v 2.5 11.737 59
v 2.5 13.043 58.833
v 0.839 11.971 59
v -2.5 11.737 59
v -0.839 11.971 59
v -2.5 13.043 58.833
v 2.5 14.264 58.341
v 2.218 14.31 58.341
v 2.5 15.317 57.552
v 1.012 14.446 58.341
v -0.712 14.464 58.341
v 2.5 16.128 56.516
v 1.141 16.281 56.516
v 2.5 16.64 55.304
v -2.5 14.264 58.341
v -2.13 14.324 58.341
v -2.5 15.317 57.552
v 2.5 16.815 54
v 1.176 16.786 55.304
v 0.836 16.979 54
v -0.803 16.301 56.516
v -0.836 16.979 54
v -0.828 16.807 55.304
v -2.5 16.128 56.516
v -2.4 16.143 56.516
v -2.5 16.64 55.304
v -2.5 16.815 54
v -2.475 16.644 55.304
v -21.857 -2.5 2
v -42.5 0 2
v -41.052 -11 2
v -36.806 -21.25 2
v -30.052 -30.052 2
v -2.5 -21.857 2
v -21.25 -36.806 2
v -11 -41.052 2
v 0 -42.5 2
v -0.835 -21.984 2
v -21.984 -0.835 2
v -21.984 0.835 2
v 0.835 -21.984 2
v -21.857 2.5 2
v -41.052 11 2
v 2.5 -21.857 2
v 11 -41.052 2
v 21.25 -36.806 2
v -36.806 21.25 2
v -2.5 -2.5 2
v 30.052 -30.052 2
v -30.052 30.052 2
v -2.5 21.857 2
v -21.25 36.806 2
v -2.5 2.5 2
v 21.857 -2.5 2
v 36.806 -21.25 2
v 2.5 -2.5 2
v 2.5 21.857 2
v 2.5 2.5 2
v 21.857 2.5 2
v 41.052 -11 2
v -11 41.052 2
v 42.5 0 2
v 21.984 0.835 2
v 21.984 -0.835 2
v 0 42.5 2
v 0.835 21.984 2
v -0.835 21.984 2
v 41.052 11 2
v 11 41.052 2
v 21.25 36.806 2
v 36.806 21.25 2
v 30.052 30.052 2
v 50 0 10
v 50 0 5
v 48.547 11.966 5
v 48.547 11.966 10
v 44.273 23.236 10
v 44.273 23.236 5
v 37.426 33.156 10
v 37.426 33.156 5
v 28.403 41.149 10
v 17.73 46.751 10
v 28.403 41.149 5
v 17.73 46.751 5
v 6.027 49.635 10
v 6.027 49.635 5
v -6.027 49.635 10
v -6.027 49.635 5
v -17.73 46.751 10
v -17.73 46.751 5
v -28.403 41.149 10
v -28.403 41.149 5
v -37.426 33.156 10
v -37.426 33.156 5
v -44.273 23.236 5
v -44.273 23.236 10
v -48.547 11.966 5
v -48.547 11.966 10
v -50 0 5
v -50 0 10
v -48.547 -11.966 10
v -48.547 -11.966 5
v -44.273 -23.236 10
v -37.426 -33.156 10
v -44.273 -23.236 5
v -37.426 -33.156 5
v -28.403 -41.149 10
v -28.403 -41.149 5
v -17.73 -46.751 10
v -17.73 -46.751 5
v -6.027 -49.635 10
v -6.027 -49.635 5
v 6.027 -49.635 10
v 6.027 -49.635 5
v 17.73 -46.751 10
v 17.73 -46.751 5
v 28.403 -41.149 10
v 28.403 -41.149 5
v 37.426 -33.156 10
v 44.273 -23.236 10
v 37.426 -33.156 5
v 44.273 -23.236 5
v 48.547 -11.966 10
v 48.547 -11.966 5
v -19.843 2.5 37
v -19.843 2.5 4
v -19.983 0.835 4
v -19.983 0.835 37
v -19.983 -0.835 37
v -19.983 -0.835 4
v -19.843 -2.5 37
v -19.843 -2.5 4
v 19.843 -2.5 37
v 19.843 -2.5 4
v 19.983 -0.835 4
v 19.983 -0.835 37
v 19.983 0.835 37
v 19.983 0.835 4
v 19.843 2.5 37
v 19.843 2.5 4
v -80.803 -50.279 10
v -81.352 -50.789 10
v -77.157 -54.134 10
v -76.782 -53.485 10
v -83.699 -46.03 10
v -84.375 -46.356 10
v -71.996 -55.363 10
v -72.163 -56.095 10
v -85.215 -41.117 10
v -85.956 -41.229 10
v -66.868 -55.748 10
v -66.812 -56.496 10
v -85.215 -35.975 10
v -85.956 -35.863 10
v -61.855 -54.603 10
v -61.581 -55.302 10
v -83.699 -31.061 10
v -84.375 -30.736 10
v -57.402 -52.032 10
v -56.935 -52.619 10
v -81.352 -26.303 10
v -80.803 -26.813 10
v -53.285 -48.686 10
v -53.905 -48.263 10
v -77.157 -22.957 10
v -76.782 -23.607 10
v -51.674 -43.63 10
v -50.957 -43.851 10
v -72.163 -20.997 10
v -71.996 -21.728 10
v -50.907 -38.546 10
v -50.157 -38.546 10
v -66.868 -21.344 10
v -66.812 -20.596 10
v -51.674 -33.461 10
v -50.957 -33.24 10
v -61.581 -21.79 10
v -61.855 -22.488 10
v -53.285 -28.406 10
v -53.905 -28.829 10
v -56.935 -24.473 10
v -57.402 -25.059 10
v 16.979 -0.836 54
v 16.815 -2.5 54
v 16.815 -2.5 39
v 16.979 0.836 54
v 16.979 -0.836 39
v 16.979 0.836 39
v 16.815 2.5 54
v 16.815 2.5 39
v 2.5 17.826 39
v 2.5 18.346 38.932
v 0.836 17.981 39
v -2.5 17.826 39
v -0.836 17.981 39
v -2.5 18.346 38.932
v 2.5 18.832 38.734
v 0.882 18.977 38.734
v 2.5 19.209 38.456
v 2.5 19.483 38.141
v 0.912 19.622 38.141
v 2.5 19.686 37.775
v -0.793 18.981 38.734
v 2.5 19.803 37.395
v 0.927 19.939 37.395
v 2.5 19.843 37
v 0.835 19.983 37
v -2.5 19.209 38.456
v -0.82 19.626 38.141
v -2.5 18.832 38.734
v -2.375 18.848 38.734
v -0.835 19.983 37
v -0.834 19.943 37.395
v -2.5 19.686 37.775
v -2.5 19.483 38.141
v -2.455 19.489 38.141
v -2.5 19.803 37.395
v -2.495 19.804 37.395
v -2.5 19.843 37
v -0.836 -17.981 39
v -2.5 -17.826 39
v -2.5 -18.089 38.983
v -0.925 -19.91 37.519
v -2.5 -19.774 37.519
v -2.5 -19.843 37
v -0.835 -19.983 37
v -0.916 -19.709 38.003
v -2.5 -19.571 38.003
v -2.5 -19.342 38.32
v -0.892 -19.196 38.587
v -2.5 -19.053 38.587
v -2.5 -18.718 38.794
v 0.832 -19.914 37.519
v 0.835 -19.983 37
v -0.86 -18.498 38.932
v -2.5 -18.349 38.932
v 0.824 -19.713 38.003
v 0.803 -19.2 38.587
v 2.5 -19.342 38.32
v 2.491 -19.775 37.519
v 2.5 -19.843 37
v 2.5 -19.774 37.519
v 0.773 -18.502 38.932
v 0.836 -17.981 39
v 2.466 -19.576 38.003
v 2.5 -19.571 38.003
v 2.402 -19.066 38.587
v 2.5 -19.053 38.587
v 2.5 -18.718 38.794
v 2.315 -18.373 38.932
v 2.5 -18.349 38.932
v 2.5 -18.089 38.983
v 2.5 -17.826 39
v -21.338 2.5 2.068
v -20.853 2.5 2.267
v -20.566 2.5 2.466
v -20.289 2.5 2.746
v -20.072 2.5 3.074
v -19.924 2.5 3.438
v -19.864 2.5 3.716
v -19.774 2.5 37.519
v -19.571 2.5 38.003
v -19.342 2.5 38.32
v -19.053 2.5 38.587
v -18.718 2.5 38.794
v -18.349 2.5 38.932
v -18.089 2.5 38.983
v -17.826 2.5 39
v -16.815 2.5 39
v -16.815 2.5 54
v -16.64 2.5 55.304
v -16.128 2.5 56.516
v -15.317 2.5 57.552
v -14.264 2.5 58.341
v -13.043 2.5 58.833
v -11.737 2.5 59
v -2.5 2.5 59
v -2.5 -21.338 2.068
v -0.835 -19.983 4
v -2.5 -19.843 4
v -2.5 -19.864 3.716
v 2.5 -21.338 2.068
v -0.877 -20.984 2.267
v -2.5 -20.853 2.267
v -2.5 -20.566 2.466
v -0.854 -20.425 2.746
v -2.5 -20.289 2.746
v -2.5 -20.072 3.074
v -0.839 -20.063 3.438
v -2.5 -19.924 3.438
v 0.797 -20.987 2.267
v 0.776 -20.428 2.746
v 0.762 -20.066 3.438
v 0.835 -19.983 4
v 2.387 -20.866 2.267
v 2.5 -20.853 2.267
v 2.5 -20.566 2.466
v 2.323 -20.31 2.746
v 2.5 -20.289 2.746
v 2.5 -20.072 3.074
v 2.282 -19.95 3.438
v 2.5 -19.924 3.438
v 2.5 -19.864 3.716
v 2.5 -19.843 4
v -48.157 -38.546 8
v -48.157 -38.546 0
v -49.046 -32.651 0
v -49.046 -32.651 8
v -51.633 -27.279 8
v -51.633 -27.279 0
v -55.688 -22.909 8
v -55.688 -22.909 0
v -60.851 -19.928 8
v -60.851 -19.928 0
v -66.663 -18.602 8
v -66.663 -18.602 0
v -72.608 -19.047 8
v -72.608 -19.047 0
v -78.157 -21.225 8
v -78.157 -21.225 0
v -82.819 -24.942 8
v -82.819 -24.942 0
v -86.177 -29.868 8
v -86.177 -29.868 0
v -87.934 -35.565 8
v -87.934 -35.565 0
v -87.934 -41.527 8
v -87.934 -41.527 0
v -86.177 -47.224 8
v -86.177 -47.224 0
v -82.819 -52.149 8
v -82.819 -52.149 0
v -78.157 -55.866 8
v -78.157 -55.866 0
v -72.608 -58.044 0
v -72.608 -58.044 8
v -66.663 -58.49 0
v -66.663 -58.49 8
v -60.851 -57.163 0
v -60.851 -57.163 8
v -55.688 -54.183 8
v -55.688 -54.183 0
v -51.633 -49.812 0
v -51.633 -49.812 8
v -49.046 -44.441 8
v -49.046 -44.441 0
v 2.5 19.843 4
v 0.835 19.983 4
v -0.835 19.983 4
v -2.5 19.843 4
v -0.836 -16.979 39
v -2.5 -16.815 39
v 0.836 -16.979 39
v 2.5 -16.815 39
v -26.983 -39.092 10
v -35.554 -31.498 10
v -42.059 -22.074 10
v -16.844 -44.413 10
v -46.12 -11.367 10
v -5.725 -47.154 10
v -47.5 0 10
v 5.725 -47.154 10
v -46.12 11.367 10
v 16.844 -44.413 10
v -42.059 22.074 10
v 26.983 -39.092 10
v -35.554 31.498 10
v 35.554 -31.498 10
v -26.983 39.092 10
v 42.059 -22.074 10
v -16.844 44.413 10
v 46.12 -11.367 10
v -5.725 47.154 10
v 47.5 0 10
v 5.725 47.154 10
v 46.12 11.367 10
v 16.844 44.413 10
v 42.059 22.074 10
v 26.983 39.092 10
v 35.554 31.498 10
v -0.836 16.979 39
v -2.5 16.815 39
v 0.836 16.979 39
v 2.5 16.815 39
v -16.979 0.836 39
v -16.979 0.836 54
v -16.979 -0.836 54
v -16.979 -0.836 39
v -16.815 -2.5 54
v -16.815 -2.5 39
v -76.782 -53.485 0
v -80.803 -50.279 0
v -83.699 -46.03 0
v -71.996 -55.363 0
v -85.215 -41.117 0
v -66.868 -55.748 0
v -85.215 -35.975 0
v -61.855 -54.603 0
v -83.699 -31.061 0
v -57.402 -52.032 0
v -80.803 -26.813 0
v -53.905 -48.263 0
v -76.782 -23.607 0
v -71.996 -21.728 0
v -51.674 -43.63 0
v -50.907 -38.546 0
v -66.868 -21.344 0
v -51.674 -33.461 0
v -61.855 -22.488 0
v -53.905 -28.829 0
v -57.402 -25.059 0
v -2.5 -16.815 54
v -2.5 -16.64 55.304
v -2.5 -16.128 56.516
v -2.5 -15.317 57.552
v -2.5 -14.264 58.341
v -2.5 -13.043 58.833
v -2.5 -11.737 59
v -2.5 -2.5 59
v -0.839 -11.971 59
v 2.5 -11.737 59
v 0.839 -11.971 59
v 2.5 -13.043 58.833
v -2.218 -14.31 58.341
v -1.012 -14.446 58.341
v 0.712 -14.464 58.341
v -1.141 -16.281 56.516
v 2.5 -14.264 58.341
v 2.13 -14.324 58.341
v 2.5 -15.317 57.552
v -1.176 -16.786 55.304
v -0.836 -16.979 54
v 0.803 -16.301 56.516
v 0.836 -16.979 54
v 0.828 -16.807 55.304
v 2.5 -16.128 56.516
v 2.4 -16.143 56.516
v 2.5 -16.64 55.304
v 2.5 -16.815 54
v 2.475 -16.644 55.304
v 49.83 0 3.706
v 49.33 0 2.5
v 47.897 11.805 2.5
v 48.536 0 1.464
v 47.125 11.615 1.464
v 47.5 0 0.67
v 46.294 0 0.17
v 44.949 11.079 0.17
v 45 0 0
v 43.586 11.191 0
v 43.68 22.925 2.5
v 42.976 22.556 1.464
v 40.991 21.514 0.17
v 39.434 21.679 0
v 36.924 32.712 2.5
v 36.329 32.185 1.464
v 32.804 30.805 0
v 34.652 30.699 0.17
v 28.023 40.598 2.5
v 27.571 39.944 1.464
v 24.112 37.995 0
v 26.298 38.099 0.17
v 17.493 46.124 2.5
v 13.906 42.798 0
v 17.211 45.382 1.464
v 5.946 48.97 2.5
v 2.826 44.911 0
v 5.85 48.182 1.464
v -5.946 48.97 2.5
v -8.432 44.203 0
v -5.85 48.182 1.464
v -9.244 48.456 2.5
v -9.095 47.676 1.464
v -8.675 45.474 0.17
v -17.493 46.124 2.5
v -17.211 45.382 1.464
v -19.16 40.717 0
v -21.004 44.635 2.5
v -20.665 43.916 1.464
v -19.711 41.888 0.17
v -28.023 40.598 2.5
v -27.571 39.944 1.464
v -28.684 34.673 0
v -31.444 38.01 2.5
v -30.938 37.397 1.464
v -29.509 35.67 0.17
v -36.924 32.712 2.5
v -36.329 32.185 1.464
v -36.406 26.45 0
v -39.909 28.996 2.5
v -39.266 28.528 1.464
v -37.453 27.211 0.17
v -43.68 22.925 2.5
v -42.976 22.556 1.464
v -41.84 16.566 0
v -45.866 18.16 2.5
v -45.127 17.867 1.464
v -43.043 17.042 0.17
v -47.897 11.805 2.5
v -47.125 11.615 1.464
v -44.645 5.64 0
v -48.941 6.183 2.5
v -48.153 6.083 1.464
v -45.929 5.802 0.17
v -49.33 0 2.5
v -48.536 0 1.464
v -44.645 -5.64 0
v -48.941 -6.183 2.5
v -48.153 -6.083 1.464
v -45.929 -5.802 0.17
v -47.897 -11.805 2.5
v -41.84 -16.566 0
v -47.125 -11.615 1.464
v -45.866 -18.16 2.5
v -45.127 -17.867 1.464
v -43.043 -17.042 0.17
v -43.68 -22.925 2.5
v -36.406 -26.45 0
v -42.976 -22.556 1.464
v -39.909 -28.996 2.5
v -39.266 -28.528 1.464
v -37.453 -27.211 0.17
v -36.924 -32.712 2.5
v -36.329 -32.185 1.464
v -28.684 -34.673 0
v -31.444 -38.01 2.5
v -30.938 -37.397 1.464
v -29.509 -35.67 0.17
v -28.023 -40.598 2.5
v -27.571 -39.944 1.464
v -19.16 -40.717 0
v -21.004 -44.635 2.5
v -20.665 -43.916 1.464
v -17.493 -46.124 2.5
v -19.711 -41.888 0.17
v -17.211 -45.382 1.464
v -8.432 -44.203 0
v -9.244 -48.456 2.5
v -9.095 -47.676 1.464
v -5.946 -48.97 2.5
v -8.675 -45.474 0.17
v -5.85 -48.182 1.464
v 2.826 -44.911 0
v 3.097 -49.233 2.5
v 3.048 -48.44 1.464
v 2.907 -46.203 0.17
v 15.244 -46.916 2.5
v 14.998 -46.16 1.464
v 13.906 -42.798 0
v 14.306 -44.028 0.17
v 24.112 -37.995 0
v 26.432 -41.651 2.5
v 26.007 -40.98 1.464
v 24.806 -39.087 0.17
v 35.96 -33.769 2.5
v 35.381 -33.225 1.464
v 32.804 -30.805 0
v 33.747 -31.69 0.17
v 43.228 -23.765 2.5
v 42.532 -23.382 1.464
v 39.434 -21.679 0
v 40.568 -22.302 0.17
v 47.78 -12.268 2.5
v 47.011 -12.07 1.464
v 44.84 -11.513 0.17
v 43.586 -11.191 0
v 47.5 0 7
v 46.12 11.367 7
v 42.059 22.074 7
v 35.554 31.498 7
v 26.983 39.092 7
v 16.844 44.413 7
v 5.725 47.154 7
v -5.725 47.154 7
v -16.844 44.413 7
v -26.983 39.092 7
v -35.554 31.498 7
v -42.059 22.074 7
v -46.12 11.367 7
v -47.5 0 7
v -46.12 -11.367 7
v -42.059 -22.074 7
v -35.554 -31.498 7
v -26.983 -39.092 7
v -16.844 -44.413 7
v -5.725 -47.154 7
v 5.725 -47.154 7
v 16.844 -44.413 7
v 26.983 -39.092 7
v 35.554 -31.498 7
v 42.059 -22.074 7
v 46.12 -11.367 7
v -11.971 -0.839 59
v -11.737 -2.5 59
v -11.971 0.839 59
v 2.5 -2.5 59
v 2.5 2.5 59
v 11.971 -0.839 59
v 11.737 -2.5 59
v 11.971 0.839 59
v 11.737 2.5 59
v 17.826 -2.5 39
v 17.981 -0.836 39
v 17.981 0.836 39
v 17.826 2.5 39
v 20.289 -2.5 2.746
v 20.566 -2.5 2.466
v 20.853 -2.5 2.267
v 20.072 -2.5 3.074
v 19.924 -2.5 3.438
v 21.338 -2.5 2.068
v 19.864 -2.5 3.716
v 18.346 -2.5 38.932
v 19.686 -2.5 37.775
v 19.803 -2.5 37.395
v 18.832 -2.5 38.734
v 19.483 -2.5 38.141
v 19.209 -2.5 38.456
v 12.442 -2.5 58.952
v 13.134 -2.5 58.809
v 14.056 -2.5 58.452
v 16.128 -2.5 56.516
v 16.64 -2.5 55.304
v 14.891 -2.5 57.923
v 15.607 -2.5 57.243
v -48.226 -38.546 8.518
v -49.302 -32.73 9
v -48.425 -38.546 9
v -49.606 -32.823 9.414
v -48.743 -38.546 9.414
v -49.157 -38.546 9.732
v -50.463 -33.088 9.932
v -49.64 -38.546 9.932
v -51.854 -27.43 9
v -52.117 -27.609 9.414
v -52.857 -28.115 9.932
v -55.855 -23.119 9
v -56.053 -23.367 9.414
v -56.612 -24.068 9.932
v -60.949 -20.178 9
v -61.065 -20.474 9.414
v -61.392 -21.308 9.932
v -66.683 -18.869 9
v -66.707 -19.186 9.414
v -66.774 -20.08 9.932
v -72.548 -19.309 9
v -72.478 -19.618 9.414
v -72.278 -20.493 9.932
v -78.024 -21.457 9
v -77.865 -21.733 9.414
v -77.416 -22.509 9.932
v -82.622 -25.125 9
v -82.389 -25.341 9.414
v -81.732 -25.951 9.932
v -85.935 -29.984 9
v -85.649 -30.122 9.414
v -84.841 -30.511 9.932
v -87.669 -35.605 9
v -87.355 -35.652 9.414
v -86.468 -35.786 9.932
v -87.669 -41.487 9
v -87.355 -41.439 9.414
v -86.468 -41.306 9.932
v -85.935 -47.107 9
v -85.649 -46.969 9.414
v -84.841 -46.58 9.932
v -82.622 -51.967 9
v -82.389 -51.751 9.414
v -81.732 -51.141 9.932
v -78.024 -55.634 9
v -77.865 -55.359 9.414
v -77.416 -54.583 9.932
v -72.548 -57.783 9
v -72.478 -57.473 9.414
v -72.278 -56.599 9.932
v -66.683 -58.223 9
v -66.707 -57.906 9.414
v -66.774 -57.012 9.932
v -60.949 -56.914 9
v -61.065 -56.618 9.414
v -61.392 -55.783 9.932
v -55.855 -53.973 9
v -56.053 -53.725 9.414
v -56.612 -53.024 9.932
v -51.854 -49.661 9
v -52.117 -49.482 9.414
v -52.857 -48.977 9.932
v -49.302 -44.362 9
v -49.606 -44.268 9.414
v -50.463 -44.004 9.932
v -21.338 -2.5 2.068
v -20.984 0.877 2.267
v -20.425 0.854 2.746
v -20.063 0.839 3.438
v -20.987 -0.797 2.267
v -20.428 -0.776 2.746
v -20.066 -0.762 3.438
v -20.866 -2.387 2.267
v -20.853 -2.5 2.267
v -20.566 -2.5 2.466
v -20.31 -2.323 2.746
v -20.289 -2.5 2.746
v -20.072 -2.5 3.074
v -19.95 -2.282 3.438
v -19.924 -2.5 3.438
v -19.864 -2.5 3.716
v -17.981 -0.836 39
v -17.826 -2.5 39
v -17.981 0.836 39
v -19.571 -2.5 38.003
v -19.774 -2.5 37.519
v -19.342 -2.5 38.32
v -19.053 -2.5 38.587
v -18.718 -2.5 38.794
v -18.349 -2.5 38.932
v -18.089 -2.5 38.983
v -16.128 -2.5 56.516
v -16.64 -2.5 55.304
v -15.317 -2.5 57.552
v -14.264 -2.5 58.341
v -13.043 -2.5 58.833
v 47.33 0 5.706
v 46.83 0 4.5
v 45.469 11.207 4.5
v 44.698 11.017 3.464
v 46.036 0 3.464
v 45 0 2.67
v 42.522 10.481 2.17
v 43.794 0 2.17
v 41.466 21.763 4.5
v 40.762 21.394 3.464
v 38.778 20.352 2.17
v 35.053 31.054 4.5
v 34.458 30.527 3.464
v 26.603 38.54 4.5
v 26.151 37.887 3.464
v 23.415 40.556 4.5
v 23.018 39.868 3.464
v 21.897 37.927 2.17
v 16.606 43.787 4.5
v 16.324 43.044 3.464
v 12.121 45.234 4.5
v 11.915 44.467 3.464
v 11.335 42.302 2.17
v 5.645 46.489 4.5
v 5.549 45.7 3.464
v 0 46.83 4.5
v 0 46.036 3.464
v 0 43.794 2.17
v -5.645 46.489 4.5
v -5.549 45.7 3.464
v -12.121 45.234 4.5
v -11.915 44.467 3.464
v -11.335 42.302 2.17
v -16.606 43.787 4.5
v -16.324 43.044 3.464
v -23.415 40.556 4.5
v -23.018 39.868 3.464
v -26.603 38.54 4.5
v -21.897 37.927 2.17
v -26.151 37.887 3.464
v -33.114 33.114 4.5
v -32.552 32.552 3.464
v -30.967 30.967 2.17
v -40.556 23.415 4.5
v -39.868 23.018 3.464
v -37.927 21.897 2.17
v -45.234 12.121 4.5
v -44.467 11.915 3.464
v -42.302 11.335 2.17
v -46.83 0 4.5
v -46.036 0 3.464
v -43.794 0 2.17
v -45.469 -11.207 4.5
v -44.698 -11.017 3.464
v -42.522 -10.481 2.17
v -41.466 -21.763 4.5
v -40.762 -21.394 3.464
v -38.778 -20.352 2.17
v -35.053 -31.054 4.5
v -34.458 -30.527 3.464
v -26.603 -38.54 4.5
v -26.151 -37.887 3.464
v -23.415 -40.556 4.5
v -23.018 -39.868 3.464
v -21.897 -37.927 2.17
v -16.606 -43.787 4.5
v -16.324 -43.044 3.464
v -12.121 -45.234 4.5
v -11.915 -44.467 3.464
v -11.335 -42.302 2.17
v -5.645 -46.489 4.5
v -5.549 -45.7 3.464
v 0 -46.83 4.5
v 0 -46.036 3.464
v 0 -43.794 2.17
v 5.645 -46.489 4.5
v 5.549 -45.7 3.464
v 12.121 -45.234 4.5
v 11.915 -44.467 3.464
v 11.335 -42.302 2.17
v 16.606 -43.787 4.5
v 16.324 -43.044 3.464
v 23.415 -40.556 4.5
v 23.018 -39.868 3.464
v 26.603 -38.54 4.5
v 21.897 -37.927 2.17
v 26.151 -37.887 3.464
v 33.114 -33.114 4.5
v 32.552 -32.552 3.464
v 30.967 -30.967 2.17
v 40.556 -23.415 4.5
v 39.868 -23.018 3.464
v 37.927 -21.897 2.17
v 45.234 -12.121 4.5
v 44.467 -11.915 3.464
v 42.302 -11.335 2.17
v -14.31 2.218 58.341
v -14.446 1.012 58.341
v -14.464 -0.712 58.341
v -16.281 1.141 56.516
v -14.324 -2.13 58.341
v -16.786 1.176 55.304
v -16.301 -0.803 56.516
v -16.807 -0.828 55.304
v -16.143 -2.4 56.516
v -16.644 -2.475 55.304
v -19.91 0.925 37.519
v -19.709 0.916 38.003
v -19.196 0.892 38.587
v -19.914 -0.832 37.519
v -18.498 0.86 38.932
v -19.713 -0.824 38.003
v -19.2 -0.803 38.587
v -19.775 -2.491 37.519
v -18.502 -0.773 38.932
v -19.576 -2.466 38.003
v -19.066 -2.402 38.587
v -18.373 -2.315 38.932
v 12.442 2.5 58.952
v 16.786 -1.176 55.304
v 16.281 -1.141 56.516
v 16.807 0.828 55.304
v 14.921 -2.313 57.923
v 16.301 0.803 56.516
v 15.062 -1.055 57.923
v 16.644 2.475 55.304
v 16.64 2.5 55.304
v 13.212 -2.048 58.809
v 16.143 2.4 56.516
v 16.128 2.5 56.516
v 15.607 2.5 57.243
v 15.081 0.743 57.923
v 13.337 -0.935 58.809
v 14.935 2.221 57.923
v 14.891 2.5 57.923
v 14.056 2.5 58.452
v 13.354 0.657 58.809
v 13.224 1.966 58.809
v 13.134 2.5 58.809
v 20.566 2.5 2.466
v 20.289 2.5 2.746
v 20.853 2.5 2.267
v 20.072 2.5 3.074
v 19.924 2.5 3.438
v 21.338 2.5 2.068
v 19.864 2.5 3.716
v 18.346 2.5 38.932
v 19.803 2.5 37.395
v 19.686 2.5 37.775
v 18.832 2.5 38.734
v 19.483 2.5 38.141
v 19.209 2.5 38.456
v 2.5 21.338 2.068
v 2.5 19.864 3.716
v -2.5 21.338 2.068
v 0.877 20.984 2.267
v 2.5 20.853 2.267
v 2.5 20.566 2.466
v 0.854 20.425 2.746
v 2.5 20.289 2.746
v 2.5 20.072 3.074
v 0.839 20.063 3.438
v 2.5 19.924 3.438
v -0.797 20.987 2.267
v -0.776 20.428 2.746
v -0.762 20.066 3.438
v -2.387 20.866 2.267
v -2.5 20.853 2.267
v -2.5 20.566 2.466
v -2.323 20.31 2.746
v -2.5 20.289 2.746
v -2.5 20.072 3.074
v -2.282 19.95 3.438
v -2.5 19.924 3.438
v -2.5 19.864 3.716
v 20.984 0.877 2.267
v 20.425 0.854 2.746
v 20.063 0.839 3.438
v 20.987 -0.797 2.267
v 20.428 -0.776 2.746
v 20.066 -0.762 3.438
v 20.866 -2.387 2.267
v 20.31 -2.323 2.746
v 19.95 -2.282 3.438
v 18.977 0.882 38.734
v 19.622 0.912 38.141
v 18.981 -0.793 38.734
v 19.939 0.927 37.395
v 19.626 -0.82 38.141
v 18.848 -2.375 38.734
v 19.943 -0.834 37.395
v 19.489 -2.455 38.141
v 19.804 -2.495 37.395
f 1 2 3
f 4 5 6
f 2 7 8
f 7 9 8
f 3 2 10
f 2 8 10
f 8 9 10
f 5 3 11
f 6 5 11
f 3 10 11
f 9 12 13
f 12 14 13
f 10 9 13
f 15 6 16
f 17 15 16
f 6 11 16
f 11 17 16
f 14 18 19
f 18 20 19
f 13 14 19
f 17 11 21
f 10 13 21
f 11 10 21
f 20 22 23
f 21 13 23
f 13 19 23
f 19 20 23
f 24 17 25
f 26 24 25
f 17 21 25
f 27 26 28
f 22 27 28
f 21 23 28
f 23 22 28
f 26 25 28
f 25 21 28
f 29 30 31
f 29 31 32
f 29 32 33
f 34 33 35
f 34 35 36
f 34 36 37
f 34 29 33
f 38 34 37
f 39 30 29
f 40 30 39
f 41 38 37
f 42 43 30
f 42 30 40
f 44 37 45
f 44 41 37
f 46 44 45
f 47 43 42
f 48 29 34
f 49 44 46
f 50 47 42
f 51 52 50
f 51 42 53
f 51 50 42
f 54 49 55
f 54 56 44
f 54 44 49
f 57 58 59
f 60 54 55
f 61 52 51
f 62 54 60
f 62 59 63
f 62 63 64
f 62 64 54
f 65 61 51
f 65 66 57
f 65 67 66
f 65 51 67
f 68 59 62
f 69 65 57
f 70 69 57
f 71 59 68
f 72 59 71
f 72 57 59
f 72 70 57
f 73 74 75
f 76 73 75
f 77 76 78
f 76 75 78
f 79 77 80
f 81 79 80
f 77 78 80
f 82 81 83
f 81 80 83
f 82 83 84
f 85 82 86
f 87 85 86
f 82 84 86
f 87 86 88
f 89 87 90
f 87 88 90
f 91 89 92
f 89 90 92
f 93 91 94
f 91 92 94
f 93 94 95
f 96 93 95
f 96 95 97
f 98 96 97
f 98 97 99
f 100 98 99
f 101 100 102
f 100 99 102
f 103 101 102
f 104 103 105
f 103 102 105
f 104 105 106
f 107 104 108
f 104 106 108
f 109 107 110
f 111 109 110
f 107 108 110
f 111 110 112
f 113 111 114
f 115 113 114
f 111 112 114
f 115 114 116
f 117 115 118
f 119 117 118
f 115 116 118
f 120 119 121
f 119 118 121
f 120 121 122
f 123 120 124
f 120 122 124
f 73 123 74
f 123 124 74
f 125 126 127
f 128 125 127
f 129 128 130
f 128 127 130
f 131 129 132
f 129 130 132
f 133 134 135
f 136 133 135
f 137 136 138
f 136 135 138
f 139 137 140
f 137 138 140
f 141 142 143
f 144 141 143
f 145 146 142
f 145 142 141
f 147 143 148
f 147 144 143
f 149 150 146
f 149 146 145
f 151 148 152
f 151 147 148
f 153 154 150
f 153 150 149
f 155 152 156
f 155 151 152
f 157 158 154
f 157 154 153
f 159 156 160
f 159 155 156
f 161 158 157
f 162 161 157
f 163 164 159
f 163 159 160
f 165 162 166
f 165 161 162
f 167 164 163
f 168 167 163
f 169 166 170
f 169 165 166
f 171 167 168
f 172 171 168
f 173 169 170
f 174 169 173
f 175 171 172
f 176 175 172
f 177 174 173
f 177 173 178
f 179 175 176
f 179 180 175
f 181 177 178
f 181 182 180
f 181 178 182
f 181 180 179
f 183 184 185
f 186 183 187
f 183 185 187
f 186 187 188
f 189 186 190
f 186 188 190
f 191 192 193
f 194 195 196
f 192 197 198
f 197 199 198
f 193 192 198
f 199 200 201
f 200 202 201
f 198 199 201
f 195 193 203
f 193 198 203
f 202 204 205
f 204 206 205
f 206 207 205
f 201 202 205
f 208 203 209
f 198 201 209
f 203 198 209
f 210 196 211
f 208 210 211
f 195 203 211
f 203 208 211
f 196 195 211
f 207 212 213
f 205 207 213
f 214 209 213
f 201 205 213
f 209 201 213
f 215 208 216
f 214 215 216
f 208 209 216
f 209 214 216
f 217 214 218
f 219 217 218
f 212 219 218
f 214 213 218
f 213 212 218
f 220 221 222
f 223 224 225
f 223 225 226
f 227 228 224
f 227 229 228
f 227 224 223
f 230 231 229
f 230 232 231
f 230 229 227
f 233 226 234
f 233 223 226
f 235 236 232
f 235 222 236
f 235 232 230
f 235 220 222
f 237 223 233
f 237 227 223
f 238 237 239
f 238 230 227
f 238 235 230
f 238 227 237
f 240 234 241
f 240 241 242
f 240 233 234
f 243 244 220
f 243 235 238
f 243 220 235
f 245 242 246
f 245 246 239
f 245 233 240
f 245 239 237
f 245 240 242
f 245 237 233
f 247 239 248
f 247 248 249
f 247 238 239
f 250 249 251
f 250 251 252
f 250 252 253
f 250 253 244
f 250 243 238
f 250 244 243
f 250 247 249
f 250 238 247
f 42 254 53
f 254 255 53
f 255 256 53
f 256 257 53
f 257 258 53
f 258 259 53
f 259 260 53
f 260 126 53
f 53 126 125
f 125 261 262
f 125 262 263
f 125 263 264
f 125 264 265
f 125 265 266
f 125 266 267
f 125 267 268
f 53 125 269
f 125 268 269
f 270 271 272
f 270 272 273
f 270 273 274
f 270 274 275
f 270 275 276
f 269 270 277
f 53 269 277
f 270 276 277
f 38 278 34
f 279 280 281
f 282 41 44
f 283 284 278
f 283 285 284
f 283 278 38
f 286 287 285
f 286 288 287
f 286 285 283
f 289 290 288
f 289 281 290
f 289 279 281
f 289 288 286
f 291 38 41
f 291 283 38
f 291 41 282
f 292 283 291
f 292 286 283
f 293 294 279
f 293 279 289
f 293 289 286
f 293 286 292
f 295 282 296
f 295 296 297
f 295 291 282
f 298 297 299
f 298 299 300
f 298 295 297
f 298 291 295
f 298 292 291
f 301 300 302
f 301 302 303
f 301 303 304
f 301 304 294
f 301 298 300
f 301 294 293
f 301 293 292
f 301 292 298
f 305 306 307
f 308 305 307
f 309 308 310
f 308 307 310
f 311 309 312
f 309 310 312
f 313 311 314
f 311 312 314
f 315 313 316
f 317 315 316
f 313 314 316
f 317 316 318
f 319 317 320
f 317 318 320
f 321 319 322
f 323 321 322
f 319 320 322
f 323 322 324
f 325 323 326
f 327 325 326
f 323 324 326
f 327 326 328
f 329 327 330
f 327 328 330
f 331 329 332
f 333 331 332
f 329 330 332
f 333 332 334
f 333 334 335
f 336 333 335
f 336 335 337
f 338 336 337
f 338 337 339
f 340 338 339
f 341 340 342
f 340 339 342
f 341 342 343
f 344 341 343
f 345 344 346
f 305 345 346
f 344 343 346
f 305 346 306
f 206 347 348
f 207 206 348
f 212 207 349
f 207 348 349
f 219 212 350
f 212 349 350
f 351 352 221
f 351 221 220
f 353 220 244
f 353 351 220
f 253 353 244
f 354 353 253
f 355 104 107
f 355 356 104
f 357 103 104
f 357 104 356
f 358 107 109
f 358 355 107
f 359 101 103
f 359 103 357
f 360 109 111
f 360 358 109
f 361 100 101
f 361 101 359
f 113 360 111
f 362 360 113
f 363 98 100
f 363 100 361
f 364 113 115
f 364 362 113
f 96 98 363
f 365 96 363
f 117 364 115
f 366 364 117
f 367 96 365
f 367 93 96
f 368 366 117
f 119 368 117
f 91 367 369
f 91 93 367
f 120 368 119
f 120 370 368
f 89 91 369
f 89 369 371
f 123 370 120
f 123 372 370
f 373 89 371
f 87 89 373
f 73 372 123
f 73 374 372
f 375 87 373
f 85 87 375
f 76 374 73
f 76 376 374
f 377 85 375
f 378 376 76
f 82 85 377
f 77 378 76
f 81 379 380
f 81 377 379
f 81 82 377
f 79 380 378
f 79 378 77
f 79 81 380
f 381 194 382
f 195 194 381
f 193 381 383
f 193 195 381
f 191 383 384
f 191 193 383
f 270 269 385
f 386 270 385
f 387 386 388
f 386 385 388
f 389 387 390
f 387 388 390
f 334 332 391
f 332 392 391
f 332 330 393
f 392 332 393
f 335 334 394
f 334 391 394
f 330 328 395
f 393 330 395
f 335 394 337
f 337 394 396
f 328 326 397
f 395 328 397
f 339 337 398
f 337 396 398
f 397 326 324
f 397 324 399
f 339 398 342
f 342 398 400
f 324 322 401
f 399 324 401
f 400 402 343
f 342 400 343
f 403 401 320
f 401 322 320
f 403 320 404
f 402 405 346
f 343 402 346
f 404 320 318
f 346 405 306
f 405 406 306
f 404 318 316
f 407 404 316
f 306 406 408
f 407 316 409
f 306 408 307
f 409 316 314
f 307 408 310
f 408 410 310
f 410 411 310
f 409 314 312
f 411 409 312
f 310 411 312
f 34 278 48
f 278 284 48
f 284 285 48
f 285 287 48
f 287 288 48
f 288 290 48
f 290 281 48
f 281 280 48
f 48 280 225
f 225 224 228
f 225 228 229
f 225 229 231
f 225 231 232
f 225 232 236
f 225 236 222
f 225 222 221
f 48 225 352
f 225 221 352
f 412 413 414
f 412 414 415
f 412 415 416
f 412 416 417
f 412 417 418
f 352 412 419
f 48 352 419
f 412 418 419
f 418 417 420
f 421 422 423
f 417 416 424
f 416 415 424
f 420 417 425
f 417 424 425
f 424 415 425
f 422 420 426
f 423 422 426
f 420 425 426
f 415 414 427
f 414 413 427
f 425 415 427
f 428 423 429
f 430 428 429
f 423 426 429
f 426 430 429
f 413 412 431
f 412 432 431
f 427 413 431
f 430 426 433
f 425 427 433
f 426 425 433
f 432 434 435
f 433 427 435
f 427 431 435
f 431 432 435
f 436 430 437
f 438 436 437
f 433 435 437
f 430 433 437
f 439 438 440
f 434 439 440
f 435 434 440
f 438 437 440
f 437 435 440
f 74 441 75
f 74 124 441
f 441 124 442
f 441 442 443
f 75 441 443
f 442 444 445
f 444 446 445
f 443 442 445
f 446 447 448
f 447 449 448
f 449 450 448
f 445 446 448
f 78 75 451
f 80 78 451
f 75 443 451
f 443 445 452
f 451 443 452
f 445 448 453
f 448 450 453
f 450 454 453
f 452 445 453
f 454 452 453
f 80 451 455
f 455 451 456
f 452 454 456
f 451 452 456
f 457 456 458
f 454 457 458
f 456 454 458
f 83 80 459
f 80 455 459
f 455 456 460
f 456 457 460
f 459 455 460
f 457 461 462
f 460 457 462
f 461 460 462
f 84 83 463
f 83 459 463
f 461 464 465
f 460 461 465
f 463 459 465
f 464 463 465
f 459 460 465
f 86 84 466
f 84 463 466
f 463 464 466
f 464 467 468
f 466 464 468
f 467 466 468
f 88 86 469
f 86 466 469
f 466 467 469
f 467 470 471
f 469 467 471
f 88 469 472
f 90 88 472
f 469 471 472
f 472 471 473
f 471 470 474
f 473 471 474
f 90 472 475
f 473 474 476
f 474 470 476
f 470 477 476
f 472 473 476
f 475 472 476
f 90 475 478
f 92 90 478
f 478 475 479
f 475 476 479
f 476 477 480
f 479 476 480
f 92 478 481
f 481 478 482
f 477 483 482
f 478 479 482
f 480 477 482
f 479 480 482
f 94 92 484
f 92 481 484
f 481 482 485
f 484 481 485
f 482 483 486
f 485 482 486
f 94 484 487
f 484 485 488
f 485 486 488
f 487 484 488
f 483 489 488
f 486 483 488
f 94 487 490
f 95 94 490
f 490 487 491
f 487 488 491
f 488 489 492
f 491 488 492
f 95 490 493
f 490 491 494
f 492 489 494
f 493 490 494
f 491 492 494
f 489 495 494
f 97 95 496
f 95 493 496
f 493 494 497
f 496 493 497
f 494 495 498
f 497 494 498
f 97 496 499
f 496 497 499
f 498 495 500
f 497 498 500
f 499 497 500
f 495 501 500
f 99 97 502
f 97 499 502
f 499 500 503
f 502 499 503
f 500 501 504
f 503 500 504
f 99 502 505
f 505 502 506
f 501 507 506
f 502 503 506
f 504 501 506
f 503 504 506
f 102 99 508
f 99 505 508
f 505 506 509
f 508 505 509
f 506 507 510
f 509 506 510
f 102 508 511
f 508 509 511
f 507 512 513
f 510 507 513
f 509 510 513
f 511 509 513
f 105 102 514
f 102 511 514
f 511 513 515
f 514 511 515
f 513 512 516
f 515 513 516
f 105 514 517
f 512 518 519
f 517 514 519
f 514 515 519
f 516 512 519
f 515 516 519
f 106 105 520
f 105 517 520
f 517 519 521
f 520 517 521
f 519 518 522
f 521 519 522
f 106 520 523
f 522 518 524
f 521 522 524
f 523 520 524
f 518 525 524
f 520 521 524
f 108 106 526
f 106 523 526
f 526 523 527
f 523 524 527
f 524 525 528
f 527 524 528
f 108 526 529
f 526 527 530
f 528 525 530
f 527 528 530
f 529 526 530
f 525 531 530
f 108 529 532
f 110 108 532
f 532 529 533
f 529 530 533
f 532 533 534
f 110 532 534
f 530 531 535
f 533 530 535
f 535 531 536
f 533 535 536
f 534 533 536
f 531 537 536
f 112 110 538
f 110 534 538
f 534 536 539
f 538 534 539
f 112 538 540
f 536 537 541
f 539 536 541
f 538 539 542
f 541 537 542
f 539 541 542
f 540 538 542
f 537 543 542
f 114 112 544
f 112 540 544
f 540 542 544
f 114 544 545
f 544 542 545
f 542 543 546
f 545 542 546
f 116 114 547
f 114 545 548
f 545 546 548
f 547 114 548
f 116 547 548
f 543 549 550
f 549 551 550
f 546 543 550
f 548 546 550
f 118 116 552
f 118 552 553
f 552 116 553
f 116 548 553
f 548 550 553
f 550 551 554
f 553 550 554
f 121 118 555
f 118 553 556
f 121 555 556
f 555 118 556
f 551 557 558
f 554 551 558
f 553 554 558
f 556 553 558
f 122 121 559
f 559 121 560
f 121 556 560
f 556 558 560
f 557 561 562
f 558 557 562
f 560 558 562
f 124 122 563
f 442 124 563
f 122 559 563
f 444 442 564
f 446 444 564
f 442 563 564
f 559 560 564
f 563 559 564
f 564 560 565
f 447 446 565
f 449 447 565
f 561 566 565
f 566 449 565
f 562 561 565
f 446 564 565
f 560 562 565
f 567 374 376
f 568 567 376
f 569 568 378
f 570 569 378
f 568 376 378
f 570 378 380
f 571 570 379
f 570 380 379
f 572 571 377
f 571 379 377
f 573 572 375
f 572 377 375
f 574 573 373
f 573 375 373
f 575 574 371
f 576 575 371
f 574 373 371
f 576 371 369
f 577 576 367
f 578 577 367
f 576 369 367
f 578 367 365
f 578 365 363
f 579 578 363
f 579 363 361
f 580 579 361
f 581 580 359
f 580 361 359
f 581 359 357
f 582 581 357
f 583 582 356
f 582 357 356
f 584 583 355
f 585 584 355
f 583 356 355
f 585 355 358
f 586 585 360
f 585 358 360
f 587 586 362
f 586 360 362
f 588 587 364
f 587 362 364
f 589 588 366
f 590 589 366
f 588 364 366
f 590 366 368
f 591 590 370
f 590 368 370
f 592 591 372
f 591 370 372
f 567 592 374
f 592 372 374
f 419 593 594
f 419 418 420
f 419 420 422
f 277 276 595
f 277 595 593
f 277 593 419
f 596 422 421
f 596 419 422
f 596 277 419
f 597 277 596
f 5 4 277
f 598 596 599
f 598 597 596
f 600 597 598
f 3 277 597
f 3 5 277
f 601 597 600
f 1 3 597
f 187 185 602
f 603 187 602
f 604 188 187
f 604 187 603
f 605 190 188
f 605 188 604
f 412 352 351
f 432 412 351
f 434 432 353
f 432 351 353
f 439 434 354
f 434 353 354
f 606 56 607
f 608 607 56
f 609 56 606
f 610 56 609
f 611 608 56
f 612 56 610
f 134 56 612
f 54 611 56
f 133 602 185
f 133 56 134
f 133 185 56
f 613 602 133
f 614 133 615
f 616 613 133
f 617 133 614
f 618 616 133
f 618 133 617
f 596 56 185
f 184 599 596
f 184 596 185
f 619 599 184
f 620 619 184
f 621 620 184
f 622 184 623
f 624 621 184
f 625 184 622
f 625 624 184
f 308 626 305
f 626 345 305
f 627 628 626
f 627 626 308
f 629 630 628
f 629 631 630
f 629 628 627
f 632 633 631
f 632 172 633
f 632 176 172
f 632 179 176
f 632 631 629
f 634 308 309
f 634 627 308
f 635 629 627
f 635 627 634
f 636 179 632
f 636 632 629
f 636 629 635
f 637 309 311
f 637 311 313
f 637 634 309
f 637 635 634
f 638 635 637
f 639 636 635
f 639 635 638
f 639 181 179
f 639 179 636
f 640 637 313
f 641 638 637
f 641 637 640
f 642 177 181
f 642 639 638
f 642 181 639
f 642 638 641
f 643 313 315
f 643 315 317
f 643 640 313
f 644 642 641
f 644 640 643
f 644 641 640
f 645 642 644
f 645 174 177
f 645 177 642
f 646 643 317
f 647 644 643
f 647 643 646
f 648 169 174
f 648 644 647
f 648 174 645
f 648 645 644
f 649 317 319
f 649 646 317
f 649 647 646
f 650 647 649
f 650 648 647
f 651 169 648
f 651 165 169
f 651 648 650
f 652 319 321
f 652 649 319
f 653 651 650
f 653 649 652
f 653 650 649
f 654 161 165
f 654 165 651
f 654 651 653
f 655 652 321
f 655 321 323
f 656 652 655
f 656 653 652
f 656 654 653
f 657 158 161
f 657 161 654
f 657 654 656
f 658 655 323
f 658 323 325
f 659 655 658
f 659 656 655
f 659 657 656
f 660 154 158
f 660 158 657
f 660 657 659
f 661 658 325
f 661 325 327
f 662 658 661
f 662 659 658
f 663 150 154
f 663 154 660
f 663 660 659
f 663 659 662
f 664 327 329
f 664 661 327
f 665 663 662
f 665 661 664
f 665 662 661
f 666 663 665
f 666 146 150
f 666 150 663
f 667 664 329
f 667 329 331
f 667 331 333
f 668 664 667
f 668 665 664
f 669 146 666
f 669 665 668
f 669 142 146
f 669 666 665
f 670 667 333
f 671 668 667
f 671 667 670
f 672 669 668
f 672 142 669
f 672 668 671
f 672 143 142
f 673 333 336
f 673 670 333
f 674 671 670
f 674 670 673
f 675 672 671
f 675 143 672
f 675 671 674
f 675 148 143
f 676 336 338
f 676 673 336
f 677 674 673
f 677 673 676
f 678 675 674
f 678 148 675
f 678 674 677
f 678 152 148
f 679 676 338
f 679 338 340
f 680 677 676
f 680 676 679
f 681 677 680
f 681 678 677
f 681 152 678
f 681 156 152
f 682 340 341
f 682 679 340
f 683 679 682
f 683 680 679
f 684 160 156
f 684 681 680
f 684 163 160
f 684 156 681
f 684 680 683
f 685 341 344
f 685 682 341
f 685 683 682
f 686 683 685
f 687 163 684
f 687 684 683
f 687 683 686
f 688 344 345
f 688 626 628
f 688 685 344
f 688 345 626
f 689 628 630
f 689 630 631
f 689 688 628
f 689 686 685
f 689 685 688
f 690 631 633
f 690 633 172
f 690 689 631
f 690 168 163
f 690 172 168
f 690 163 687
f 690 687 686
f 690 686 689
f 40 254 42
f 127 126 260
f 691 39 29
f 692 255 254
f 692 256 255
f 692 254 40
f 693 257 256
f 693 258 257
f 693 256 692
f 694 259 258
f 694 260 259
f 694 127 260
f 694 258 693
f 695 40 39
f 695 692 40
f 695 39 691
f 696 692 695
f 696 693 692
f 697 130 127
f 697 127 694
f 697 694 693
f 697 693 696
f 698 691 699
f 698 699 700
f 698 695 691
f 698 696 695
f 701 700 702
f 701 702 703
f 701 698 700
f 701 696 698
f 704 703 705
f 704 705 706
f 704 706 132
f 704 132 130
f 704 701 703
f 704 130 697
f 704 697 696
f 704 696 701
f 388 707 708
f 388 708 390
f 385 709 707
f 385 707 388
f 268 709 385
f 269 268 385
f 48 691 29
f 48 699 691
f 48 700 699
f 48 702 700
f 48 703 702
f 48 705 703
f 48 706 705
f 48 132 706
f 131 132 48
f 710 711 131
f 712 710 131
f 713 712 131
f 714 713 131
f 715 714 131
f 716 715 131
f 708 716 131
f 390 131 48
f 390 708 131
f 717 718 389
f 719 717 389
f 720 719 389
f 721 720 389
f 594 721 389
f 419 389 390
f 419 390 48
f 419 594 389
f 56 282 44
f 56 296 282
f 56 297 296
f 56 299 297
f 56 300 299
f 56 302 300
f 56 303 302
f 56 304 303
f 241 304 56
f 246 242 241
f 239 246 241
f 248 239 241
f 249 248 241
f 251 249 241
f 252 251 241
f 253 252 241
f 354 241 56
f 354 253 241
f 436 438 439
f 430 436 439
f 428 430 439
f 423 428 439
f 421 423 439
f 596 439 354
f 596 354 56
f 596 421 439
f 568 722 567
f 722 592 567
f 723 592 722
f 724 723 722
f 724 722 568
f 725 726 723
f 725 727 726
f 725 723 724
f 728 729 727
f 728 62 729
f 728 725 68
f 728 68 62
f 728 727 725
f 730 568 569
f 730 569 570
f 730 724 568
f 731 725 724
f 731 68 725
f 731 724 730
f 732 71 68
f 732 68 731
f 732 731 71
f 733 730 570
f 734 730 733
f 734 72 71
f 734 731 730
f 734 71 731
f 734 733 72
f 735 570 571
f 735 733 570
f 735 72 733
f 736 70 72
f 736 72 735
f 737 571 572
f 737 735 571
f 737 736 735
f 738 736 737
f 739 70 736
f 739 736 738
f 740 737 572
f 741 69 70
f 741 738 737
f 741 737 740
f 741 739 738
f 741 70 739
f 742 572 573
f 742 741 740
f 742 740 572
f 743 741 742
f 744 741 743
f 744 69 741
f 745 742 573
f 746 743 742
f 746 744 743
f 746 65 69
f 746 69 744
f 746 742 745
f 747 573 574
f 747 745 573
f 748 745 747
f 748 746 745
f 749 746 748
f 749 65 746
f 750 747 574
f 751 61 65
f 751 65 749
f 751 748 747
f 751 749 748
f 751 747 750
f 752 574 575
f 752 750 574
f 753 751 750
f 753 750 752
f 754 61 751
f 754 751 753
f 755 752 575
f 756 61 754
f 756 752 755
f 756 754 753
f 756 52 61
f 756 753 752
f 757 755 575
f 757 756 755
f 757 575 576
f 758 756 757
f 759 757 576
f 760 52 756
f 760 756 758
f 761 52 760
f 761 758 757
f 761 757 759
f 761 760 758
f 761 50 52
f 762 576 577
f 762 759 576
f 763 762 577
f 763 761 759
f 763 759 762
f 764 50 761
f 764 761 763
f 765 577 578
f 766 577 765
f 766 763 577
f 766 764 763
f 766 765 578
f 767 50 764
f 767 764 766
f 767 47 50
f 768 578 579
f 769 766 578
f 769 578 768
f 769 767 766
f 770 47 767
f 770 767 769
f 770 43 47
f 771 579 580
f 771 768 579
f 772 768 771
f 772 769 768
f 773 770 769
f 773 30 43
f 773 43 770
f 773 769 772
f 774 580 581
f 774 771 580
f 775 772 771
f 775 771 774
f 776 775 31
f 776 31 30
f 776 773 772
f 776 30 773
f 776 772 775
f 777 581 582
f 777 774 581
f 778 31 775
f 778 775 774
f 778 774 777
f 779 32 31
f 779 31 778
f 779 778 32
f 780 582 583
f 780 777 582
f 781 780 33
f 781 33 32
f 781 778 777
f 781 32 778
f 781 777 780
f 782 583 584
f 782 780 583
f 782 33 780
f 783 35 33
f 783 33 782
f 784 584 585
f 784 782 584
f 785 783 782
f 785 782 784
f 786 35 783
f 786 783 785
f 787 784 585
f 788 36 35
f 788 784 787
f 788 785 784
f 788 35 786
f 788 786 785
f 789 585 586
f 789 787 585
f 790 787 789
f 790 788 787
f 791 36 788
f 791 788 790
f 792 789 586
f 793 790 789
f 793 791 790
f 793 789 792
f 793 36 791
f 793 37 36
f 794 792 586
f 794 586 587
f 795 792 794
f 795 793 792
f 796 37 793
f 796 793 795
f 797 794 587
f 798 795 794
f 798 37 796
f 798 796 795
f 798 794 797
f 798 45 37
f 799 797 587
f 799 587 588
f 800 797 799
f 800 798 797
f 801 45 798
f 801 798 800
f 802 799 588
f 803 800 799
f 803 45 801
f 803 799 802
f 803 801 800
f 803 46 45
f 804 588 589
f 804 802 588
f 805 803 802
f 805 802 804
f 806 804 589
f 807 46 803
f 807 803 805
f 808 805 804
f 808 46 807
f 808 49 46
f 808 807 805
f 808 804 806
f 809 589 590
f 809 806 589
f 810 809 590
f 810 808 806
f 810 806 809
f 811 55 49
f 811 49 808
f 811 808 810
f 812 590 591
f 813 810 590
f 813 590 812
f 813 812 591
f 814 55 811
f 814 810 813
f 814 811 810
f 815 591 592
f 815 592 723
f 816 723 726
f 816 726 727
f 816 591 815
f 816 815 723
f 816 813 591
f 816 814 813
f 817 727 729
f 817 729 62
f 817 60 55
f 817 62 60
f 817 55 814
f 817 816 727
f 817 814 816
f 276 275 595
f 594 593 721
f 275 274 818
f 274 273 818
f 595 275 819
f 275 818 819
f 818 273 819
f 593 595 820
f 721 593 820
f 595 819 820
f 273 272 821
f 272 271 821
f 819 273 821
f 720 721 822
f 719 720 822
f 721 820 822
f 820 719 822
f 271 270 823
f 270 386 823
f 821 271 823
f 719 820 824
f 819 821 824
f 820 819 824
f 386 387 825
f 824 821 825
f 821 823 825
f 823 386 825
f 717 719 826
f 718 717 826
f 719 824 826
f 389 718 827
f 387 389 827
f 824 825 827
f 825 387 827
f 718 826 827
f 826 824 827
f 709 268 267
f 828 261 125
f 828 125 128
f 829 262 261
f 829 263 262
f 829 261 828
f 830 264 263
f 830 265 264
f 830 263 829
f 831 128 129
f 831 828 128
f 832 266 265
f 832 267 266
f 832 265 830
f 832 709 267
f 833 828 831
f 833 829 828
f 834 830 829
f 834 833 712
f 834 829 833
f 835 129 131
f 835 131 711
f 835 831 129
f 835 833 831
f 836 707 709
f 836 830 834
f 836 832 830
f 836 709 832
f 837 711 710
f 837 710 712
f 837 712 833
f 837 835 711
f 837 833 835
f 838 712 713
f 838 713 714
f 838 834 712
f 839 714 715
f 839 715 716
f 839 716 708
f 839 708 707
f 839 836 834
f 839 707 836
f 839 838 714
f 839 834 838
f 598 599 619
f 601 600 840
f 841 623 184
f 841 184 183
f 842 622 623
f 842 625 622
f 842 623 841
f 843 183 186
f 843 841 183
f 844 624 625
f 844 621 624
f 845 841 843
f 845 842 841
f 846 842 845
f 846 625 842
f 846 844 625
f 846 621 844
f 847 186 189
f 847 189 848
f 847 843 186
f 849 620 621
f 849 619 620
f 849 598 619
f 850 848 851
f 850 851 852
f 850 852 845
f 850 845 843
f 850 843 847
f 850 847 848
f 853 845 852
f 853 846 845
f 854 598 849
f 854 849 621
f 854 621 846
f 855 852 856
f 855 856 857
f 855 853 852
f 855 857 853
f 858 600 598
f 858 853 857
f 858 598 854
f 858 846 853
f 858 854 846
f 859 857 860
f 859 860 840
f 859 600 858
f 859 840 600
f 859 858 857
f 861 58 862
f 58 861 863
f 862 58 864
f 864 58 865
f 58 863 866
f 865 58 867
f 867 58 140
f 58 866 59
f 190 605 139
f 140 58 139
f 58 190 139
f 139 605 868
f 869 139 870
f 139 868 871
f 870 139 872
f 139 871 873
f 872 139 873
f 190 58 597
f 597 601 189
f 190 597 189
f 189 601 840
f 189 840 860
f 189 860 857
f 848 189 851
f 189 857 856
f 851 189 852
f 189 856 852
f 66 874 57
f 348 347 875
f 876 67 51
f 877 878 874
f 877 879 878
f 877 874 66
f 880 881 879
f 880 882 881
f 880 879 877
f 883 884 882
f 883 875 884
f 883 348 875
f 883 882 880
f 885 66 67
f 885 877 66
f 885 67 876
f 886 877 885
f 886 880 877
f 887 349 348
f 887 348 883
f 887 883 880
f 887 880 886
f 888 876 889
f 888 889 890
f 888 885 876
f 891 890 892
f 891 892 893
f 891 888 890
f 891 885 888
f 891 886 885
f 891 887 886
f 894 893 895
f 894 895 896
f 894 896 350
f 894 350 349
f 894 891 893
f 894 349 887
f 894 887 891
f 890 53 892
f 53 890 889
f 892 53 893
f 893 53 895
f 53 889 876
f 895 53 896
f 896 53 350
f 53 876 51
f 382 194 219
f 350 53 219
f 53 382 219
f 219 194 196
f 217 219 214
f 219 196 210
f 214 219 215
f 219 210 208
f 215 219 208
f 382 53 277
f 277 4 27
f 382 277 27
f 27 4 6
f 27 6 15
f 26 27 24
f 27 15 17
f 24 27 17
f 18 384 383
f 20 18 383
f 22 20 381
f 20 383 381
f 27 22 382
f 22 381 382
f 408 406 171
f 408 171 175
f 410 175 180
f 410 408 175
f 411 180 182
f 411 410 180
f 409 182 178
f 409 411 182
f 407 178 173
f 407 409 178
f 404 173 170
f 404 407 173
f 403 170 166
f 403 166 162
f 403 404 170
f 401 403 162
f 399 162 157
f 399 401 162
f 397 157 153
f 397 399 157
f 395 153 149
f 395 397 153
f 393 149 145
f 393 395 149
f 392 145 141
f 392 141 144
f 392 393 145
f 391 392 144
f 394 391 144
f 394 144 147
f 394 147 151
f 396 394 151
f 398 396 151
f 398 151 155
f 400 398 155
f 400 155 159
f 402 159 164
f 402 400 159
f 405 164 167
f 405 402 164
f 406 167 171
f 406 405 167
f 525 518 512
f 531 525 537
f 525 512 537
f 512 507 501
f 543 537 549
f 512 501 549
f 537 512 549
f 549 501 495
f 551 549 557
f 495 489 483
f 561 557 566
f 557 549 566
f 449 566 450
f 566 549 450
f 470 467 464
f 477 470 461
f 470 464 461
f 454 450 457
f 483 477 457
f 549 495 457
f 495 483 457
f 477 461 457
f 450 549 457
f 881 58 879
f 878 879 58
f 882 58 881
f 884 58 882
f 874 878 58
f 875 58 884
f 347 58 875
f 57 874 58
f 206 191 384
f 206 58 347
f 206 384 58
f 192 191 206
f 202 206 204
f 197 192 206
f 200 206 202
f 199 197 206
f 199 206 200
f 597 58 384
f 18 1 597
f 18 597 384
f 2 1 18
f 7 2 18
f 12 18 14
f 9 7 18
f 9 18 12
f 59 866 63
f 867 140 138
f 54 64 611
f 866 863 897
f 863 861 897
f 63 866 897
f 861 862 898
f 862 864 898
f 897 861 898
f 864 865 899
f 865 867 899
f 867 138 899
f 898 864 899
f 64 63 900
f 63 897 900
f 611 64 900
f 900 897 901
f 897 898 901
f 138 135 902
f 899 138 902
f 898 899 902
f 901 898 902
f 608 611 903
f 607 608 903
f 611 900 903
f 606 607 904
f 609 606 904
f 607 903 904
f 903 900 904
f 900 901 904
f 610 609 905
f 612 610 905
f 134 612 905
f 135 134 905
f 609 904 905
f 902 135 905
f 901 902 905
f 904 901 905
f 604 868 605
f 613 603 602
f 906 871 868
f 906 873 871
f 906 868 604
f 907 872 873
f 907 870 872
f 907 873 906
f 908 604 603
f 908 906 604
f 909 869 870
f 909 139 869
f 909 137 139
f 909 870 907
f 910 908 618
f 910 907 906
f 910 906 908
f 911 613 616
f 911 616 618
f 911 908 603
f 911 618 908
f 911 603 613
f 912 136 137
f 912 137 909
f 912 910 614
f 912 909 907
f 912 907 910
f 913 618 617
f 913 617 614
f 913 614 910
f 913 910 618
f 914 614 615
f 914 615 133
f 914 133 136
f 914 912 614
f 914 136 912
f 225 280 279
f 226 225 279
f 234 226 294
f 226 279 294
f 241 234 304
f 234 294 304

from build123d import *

# Parameters (mm, degrees)
F0_R      = 50
F1_DEPTH  = 10
F2_R      = 47.5
F3_DEPTH  = 8
F4_R      = 5
F5_R      = 20
F6_DEPTH  = 37
F7_R      = 17
F8_DEPTH  = 20
F9_W      = 26.4220045281
F9_H      = 25.0961510785
F9_W_2    = 24.3472188315
F9_W_3    = 25.1923035735
F9_H_2    = 21.7307658747
F9_W_4    = 25.5566187577
F9_H_3    = 23.3653835039
F10_DEPTH = 57
F11_R     = 5
F12_R     = 2
F13_R     = 20
F13_R_2   = 17.25
F14_DEPTH = 10
F15_R     = 2


with BuildPart() as f1:
    # F0 (on Top) → F1 (new body)
    with BuildSketch(Plane.XY):
        Circle(F0_R)
    extrude(amount=F1_DEPTH)

    # F2 (on face) → F3 (cut)
    with BuildSketch(Plane.XY.offset(10)):
        Circle(F2_R)
    extrude(amount=-F3_DEPTH, mode=Mode.SUBTRACT)

    # F4
    f4_edges = [f1.edges().sort_by_distance(p)[0] for p in [
        (-50, 0, 0),
        (-47.5, 0, 2),
    ]]
    fillet(f4_edges, radius=F4_R)

    # F5 (on face) → F6 (join)
    with BuildSketch(Plane.XY.offset(2)):
        Circle(F5_R)
    extrude(amount=F6_DEPTH)

    # F7 (on face) → F8 (join)
    with BuildSketch(Plane.XY.offset(39)):
        Circle(F7_R)
    extrude(amount=F8_DEPTH)

    # F9 (on face) → F10 (cut)
    with BuildSketch(Plane.XY.offset(59)):
        with Locations((-15.7110022641, 15.0480755392)):
            Rectangle(F9_W, F9_H)
        with Locations((14.6736094158, 15.0480755392)):
            Rectangle(F9_W_2, F9_H)
        with Locations((15.0961517867, -13.3653829373)):
            Rectangle(F9_W_3, F9_H_2)
        with Locations((-15.2783093789, -14.182691752)):
            Rectangle(F9_W_4, F9_H_3)
    extrude(amount=-F10_DEPTH, mode=Mode.SUBTRACT)

    # F11
    f11_edges = [f1.edges().sort_by_distance(p)[0] for p in [
        (-17, 0, 59),
        (0, -17, 59),
        (17, 0, 59),
        (0, 17, 59),
    ]]
    fillet(f11_edges, radius=F11_R)

    # F12
    f12_edges = [f1.edges().sort_by_distance(p)[0] for p in [
        (-20, 0, 39),
        (0, -20, 39),
        (20, 0, 39),
        (0, 20, 39),
        (0, -20, 2),
        (-20, 0, 2),
        (0, 20, 2),
        (20, 0, 2),
    ]]
    fillet(f12_edges, radius=F12_R)


with BuildPart() as f14:
    # F13 (on Top) → F14 (new body)
    with BuildSketch(Plane.XY):
        with Locations((-68.1574866176, -38.545884192)):
            Circle(F13_R)
        with Locations((-68.1574866176, -38.545884192)):
            Circle(F13_R_2, mode=Mode.SUBTRACT)
    extrude(amount=F14_DEPTH)

    # F15
    f15_edges = [f14.edges().sort_by_distance(p)[0] for p in [
        (-88.157487, -38.545884, 10),
    ]]
    fillet(f15_edges, radius=F15_R)


solid = Compound([f1.part, f14.part])
